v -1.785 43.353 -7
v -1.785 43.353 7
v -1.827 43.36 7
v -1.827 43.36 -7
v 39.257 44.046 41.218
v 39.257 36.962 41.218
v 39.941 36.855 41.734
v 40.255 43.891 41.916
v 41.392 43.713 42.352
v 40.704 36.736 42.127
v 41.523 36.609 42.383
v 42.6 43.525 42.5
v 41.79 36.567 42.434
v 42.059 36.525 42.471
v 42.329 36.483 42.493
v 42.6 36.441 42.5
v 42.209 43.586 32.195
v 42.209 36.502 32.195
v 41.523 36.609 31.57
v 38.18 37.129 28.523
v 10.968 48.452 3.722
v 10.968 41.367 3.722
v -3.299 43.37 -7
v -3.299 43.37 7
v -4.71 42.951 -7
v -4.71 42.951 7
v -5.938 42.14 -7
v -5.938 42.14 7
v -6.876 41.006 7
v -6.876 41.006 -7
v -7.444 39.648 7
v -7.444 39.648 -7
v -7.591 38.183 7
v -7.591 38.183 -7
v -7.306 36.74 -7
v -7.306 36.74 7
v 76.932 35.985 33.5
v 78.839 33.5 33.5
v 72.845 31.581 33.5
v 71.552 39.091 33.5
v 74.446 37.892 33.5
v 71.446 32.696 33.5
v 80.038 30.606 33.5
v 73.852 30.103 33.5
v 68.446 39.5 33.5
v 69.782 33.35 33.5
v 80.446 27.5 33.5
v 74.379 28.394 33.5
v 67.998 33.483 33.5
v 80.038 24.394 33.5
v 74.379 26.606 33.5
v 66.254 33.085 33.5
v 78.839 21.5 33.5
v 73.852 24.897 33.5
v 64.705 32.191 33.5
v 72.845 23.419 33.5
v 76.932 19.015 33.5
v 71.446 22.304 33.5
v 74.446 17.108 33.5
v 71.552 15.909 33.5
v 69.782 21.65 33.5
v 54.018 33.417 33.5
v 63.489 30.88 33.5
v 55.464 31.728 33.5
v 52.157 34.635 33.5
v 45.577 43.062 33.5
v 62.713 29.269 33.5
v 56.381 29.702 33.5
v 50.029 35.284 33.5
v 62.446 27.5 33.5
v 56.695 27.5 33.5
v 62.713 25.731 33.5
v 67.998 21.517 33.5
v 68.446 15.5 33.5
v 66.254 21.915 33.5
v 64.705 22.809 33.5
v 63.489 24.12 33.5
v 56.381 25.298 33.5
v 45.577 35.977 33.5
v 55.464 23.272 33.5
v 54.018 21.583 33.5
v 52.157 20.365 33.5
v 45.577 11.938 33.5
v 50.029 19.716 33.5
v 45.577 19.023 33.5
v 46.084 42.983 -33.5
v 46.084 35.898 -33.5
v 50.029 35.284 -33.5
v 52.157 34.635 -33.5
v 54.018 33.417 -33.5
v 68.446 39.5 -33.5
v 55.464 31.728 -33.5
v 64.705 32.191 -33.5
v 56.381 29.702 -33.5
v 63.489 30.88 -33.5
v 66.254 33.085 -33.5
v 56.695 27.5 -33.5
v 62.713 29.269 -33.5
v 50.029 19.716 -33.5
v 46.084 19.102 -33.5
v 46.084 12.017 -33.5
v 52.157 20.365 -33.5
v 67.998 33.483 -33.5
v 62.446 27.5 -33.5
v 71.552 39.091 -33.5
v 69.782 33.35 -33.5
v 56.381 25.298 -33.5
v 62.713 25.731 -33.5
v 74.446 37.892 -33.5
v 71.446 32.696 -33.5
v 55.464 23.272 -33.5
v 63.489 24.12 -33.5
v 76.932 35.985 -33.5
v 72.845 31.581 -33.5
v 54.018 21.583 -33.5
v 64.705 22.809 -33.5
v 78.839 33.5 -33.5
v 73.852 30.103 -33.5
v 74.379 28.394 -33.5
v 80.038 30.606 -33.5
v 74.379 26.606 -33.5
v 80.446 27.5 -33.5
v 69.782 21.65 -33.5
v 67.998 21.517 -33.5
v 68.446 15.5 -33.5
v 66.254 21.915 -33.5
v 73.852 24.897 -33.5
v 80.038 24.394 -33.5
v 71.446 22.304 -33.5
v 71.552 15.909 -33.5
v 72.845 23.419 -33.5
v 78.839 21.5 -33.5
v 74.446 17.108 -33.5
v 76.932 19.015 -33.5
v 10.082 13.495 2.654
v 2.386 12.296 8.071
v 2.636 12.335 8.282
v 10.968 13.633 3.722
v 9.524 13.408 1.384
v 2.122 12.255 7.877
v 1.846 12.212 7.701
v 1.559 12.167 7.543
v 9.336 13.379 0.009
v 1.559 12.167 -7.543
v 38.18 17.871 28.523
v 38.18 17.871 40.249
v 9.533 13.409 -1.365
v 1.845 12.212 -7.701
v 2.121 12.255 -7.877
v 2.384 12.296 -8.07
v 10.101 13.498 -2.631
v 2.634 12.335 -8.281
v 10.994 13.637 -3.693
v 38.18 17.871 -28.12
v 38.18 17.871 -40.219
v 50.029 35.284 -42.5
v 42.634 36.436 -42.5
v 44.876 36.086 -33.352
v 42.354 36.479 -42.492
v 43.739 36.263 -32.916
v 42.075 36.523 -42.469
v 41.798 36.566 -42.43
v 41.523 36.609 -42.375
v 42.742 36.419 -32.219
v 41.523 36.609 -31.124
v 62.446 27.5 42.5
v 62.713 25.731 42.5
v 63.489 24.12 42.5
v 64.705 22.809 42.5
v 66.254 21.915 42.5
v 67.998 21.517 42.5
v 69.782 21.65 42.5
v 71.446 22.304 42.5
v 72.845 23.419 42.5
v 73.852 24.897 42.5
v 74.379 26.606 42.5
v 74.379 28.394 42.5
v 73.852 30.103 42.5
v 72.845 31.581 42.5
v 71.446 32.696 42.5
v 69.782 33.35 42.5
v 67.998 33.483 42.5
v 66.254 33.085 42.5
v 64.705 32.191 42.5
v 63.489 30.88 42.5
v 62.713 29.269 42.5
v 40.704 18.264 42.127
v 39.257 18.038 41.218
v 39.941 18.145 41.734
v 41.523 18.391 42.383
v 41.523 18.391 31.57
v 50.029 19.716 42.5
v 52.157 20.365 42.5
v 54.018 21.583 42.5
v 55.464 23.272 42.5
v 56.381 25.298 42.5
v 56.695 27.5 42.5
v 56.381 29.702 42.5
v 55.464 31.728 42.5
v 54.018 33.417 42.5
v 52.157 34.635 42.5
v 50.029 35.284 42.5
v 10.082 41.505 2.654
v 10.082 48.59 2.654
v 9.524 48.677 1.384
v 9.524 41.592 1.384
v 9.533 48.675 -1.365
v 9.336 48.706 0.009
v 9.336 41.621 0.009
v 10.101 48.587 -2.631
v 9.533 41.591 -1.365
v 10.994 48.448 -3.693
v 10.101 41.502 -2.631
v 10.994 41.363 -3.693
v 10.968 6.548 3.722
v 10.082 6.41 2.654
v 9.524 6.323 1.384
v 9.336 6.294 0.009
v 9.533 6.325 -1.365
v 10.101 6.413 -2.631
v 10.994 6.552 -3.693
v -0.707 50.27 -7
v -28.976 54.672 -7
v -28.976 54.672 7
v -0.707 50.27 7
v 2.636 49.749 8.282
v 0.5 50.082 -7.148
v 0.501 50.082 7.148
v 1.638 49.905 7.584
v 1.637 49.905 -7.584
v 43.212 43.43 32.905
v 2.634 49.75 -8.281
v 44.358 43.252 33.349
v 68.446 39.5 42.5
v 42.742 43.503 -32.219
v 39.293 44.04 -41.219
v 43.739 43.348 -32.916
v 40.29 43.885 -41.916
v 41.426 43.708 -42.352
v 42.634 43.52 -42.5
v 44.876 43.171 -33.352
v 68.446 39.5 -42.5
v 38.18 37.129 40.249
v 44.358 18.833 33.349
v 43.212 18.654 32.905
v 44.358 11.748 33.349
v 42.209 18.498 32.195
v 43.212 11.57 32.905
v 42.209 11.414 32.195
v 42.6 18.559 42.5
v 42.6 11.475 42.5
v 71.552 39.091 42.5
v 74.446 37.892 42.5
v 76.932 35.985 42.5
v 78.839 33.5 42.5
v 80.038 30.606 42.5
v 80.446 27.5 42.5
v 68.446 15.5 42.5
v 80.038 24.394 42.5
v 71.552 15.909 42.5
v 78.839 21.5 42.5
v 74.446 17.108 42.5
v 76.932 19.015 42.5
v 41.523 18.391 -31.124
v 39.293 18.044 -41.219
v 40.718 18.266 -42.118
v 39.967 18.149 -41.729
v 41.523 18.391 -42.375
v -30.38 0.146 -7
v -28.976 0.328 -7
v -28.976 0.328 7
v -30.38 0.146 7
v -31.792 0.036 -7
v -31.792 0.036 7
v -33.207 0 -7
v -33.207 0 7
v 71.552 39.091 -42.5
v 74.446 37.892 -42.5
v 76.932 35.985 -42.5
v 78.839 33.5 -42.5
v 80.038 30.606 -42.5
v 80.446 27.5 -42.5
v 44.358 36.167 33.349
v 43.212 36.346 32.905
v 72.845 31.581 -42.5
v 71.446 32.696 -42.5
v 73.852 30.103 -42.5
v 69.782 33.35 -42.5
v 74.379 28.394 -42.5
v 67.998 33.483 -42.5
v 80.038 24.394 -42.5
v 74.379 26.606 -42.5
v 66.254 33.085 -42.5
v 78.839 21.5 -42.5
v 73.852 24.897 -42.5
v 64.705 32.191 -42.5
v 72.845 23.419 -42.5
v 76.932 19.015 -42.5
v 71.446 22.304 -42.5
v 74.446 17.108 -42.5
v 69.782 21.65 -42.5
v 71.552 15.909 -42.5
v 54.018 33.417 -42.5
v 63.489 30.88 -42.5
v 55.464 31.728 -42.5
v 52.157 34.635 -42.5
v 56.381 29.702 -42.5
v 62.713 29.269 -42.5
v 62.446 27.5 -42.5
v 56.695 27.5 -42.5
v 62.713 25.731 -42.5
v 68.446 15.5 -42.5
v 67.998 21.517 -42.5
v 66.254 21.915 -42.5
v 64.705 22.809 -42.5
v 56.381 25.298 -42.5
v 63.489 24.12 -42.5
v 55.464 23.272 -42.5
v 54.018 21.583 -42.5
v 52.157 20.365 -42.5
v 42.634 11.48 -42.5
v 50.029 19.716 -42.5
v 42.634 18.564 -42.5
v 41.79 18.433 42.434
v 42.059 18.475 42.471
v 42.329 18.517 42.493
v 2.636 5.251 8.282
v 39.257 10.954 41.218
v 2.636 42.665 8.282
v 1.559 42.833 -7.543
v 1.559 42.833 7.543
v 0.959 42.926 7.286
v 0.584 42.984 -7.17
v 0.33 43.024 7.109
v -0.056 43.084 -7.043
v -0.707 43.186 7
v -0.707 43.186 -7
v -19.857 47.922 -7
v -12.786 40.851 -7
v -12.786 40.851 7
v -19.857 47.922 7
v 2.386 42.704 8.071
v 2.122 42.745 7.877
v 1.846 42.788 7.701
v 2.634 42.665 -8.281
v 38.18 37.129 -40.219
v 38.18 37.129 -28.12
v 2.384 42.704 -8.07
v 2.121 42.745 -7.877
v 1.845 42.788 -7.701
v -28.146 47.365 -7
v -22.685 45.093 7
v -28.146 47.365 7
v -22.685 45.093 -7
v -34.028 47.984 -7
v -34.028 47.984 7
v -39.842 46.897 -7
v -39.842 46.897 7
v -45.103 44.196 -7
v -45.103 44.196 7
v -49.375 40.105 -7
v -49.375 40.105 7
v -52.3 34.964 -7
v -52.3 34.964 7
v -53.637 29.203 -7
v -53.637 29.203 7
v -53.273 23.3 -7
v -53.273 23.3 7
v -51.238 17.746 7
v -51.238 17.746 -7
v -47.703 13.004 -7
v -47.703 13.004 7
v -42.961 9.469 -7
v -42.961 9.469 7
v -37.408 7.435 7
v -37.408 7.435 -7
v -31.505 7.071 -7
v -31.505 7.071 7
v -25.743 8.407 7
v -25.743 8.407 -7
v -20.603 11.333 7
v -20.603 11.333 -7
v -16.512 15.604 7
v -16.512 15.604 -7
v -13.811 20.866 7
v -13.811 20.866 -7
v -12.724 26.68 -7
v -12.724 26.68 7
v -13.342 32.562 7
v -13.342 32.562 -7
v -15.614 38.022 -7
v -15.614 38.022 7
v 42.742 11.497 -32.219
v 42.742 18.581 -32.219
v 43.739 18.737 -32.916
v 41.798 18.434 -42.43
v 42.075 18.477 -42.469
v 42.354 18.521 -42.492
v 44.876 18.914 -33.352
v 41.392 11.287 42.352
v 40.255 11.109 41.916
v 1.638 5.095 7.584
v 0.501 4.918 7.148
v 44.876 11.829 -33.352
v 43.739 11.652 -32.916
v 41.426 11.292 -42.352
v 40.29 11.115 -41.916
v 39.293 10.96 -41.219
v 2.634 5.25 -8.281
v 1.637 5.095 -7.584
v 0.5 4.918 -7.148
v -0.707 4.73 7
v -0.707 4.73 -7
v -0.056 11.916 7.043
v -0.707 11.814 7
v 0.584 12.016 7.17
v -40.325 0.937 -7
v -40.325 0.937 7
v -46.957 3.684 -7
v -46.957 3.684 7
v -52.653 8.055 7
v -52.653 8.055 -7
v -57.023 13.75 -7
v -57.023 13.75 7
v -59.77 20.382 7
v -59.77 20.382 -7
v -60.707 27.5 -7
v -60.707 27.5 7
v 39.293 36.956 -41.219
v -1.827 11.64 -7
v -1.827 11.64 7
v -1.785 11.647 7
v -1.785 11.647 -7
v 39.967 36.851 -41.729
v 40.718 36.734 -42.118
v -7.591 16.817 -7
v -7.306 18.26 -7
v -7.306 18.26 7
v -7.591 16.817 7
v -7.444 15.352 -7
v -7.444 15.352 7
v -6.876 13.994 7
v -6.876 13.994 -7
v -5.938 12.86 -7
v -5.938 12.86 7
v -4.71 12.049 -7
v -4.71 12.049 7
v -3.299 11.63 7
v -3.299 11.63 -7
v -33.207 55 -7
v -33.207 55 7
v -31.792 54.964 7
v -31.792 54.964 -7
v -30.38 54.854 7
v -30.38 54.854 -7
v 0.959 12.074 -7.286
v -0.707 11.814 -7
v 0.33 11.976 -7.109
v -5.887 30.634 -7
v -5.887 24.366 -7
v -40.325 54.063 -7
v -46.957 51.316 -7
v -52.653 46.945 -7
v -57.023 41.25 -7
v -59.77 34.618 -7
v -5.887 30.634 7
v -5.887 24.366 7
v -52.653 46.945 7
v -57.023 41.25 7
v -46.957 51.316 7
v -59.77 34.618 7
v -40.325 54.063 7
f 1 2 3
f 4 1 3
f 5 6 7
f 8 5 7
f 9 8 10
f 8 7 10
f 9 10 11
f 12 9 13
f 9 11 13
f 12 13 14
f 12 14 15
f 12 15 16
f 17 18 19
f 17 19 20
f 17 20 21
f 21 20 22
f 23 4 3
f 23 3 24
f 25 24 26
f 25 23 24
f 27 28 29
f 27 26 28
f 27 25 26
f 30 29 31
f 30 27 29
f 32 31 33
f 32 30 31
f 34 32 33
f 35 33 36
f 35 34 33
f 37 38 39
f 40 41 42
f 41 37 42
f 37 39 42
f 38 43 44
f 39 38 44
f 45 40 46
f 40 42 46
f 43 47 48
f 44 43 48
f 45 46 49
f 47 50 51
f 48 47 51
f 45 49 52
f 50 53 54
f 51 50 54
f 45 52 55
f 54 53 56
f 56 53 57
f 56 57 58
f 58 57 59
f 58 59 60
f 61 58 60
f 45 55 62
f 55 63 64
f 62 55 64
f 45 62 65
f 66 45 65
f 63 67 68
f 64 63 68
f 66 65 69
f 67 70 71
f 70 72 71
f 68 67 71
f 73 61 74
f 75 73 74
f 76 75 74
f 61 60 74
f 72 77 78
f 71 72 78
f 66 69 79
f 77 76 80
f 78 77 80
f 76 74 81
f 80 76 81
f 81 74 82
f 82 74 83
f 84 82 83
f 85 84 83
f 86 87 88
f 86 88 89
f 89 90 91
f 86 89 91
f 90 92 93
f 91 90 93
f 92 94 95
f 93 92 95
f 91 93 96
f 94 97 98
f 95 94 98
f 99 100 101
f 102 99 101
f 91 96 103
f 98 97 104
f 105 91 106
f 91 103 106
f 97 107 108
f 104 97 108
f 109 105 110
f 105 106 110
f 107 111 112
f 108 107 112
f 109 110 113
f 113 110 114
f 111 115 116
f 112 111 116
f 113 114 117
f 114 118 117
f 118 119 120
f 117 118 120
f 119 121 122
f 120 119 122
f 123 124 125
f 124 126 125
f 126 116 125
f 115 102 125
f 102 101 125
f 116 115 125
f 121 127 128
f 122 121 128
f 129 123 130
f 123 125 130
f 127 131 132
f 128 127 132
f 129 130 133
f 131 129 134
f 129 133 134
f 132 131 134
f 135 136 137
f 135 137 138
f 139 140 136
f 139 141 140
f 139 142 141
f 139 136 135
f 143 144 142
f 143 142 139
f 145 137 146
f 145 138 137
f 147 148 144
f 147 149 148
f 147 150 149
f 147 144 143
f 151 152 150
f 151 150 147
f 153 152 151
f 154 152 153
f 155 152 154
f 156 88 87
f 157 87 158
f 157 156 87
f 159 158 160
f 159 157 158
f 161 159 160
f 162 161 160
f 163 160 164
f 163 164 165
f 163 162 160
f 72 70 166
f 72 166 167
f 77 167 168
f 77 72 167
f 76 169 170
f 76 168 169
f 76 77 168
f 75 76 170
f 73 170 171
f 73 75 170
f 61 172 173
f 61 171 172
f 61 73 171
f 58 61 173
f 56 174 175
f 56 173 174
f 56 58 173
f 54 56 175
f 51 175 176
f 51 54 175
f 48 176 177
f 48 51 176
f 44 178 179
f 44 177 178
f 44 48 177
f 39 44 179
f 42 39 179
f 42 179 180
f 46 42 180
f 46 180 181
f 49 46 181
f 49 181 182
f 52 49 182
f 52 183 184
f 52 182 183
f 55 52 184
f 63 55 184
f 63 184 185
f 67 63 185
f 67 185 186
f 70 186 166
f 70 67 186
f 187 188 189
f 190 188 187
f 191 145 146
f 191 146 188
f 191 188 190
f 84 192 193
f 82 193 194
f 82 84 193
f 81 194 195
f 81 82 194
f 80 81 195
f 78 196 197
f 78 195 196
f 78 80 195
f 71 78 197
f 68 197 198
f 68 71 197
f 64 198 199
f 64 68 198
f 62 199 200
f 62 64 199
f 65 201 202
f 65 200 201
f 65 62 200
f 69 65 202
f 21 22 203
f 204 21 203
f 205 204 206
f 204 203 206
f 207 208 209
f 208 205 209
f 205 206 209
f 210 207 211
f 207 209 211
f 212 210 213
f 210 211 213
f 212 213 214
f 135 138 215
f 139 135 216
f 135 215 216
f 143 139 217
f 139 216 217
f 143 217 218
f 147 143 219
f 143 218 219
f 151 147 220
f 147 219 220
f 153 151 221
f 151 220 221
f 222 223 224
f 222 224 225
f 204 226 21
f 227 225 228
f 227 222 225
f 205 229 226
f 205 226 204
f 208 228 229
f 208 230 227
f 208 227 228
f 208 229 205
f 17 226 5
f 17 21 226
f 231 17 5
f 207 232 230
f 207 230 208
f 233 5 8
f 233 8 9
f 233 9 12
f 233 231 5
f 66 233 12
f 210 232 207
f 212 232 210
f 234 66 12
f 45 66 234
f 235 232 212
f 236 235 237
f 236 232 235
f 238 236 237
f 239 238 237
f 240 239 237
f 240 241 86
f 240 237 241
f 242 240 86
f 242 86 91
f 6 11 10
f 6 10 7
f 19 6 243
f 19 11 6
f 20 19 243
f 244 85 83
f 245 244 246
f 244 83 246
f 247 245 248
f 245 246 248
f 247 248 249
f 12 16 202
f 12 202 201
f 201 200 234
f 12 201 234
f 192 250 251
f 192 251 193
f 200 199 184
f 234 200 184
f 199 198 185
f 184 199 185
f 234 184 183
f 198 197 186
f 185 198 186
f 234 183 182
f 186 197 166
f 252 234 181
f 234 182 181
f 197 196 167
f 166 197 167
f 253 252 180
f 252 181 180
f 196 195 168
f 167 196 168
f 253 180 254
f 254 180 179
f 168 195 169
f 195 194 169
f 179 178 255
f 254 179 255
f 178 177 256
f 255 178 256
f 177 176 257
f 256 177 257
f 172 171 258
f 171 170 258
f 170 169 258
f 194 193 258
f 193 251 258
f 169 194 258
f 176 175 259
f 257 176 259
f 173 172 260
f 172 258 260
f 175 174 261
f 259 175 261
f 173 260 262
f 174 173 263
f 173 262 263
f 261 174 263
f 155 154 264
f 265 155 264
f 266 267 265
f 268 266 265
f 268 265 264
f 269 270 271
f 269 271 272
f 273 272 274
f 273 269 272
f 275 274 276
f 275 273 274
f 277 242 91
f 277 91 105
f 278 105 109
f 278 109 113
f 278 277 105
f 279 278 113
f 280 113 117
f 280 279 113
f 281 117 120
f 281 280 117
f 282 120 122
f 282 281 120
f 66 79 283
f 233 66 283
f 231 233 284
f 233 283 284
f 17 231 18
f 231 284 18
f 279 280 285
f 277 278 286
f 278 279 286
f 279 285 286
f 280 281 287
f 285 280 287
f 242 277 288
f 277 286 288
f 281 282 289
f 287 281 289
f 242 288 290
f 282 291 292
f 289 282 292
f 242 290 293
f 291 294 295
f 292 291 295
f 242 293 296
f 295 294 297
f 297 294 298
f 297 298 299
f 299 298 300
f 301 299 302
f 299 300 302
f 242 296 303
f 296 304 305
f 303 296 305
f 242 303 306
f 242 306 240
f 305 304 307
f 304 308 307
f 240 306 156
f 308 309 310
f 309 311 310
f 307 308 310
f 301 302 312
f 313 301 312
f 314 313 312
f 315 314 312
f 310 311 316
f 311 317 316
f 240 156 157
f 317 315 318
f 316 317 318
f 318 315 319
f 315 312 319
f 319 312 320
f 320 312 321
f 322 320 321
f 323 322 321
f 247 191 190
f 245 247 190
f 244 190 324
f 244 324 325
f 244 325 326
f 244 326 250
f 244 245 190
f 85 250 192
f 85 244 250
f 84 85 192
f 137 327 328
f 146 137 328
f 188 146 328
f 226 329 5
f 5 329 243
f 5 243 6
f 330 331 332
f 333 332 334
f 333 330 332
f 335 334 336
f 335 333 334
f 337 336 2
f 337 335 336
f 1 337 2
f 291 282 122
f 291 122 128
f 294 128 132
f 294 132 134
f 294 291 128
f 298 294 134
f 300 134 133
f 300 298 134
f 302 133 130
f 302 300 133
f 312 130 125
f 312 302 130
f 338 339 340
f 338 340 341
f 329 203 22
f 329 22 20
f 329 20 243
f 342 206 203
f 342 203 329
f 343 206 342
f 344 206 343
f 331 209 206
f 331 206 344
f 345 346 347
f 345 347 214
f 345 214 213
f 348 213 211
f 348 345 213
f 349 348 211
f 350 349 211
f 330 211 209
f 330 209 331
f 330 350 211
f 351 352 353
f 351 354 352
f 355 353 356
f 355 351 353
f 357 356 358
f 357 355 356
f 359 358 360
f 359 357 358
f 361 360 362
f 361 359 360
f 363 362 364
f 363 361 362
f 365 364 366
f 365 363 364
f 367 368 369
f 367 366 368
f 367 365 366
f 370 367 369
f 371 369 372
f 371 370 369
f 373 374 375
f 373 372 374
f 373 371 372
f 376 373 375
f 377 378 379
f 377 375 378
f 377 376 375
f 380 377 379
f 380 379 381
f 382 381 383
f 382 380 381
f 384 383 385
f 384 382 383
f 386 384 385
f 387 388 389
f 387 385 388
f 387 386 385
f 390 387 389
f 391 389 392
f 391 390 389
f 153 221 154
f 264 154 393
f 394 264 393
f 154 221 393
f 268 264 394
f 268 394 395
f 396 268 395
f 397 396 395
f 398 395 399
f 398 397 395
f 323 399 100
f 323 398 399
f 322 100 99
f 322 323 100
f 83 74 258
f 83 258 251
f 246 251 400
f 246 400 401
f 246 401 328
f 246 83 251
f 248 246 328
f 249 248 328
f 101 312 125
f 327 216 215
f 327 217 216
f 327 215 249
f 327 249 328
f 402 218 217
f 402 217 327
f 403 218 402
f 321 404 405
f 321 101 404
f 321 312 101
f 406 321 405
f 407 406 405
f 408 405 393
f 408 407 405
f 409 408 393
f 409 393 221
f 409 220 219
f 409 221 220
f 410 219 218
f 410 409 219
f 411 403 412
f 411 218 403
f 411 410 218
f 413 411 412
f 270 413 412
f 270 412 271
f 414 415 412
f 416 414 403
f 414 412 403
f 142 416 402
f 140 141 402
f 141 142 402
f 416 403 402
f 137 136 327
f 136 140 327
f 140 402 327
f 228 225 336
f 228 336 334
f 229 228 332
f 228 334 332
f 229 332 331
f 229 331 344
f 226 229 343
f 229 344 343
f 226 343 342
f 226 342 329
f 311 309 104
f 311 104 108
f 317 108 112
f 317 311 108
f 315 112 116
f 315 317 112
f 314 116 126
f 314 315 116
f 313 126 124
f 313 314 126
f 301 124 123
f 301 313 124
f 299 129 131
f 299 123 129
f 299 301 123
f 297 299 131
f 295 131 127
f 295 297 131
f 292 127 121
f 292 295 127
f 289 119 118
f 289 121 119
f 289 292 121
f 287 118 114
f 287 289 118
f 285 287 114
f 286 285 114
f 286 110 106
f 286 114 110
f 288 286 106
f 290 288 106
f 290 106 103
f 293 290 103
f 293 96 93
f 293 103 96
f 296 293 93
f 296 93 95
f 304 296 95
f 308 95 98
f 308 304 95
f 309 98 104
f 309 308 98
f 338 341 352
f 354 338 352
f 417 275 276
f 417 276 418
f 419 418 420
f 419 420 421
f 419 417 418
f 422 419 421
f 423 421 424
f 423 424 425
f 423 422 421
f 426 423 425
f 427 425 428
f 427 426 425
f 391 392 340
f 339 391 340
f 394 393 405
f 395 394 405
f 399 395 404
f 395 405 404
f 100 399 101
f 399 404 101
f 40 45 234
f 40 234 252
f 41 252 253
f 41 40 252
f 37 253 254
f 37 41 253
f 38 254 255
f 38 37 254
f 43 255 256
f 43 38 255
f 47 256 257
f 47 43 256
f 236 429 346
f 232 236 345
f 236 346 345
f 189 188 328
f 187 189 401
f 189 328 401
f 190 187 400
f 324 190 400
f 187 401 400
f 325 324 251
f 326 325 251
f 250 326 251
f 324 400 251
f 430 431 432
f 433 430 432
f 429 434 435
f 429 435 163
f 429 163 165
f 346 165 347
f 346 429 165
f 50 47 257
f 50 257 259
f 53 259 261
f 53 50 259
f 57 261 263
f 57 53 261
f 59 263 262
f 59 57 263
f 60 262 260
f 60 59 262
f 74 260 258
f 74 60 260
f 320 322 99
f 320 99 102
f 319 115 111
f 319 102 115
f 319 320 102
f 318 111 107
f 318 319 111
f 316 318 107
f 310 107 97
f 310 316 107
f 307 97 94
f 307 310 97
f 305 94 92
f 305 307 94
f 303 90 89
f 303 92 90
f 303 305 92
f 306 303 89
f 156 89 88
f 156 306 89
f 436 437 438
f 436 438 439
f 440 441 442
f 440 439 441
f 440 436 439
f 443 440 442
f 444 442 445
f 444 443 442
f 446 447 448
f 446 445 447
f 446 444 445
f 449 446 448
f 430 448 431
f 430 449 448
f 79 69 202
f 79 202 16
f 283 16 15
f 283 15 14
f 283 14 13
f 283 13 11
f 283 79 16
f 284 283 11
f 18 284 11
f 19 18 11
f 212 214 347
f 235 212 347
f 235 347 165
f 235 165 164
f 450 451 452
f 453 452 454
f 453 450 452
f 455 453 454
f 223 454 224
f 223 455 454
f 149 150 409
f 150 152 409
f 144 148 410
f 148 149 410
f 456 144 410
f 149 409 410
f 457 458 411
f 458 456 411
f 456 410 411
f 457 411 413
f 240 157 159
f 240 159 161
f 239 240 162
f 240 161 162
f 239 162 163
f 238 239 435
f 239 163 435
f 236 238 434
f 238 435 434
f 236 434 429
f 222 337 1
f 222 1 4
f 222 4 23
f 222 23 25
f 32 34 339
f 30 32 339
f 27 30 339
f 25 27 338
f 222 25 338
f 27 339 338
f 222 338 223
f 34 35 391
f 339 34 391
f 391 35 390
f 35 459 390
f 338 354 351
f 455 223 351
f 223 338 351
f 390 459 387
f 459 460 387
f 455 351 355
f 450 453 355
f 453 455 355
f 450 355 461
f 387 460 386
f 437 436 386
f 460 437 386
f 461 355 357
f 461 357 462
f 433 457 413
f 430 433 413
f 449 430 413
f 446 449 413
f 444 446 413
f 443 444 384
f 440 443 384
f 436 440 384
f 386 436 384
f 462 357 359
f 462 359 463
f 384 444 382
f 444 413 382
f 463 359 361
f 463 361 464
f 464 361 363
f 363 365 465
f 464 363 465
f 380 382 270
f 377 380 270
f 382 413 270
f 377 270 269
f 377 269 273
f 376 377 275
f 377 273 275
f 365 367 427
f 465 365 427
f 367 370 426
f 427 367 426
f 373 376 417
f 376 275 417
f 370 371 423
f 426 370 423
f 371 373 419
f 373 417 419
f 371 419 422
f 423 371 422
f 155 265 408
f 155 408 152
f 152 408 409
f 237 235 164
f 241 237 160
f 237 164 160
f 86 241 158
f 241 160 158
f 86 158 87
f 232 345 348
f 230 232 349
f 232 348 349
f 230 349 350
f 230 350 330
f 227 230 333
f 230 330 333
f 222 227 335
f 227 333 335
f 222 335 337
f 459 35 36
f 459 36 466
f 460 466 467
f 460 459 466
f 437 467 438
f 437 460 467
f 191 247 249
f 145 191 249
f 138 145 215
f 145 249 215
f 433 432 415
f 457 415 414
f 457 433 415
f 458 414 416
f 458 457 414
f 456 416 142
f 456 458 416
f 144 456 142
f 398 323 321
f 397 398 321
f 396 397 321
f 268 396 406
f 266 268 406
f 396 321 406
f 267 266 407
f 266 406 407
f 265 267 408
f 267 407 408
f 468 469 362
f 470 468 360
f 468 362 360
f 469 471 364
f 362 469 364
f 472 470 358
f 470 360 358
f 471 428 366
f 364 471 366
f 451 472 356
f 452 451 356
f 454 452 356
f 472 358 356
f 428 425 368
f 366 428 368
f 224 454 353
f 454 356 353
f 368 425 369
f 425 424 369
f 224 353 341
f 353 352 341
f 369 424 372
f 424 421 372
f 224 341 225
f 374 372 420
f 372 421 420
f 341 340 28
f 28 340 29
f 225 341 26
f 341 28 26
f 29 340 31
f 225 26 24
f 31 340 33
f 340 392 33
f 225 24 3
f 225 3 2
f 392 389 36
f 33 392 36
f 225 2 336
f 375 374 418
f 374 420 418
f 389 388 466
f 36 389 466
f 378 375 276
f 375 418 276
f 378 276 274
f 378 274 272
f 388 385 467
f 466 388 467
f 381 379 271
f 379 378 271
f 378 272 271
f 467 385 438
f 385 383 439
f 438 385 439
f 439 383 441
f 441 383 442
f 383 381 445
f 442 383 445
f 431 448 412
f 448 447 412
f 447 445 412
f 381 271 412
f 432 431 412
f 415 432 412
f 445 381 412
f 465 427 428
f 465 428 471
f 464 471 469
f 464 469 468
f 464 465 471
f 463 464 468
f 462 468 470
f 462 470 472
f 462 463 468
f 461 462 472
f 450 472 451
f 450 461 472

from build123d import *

# Parameters (mm, degrees)
Y_KSEKLIK_EKSTR_ZYON1_DEPTH = 55
KES_EKSTR_ZYON1_DEPTH       = 55
KES_EKSTR_ZYON1_DEPTH_BACK  = 55
IZIM4_R                     = 20.5
IZIM4_R_2                   = 6
KES_EKSTR_ZYON2_DEPTH       = 55
KES_EKSTR_ZYON2_DEPTH_BACK  = 55
KES_EKSTR_ZYON3_DEPTH       = 107.314994316
KES_EKSTR_ZYON3_DEPTH_BACK  = 107.314994316


with BuildPart() as part:
    # Çizim2 → Yükseklik-Ekstrüzyon1 (new body)
    with BuildSketch(Plane(origin=(0, 0, 0), x_dir=(1, 0, 0), z_dir=(0, 1, 0))):
        with BuildLine():
            Line((-60.70745329, -7), (-0.70745329, -7))
            ThreePointArc((-0.70745329, -7), (1.083042474, -7.331582183), (2.636059642, -8.282350033))
            Line((2.636059642, -8.282350033), (39.256799322, -41.217649967))
            ThreePointArc((39.256799322, -41.217649967), (40.809816489, -42.168417817), (42.600312254, -42.5))
            Line((42.600312254, -42.5), (80.446429482, -42.5))
            Line((80.446429482, -42.5), (80.446429482, -33.5))
            Line((80.446429482, -33.5), (45.577301243, -33.5))
            ThreePointArc((45.577301243, -33.5), (43.771367773, -33.162467619), (42.209258712, -32.19544172))
            Line((42.209258712, -32.19544172), (10.967785126, -3.72181941))
            ThreePointArc((10.967785126, -3.72181941), (9.335858983, -0.008678576), (10.994031787, 3.692815818))
            Line((10.994031787, 3.692815818), (42.741966981, 32.219193509))
            ThreePointArc((42.741966981, 32.219193509), (44.294345006, 33.168831093), (46.083762852, 33.5))
            Line((46.083762852, 33.5), (80.446429482, 33.5))
            Line((80.446429482, 33.5), (80.446429482, 42.5))
            Line((80.446429482, 42.5), (42.634342581, 42.5))
            ThreePointArc((42.634342581, 42.5), (40.844924735, 42.168831093), (39.29254671, 41.219193509))
            Line((39.29254671, 41.219193509), (2.634342581, 8.280806491))
            ThreePointArc((2.634342581, 8.280806491), (1.081964556, 7.331168907), (-0.70745329, 7))
            Line((-0.70745329, 7), (-60.70745329, 7))
            Line((-60.70745329, 7), (-60.70745329, -7))
        make_face()
    extrude(amount=Y_KSEKLIK_EKSTR_ZYON1_DEPTH)

    # Çizim4 → Kes-Ekstrüzyon1 (cut, two sides: drawn at the far end of the back side and taken through both)
    with BuildSketch(Plane.XY.offset(-KES_EKSTR_ZYON1_DEPTH_BACK)):
        with BuildLine():
            Line((-28.975635888, 54.672444157), (68.446429482, 39.5))
            ThreePointArc((68.446429482, 39.5), (76.931710856, 35.985281374), (80.446429482, 27.5))
            Line((80.446429482, 27.5), (80.446429482, 55))
            Line((80.446429482, 55), (-33.207453133, 55))
            ThreePointArc((-33.207453133, 55), (-31.085215516, 54.917988745), (-28.975635888, 54.672444157))
        make_face()
        with BuildLine():
            Line((80.446429482, 0), (80.446429482, 27.5))
            ThreePointArc((80.446429482, 27.5), (76.931710856, 19.014718626), (68.446429482, 15.5))
            Line((68.446429482, 15.5), (-28.975635888, 0.327555843))
            ThreePointArc((-28.975635888, 0.327555843), (-31.085215594, 0.082011249), (-33.20745329, 0))
            Line((-33.20745329, 0), (80.446429482, 0))
        make_face()
        with BuildLine():
            ThreePointArc((-60.70745329, 27.5), (-52.652889717, 46.945436538), (-33.207453133, 55))
            Line((-33.207453133, 55), (-60.70745329, 55))
            Line((-60.70745329, 55), (-60.70745329, 27.5))
        make_face()
        with BuildLine():
            ThreePointArc((-33.20745329, 0), (-52.652889773, 8.054563517), (-60.70745329, 27.5))
            Line((-60.70745329, 27.5), (-60.70745329, 0))
            Line((-60.70745329, 0), (-33.20745329, 0))
        make_face()
        with Locations(Location((-33.20745329, 27.5, 0), (0, 0, 180))):
            Circle(IZIM4_R)
        with Locations(Location((68.446429482, 27.5, 0), (0, 0, 180))):
            Circle(IZIM4_R_2)
    extrude(amount=KES_EKSTR_ZYON1_DEPTH + KES_EKSTR_ZYON1_DEPTH_BACK, mode=Mode.SUBTRACT)

    # Çizim7 → Kes-Ekstrüzyon2 (cut, two sides: drawn at the far end of the back side and taken through both)
    with BuildSketch(Plane.XY.offset(-KES_EKSTR_ZYON2_DEPTH_BACK)):
        with BuildLine():
            Line((-15.614003465, 38.022382014), (-12.78557634, 40.850809138))
            Line((-12.78557634, 40.850809138), (-19.856644152, 47.92187695))
            Line((-19.856644152, 47.92187695), (-22.685071277, 45.093449825))
            ThreePointArc((-22.685071277, 45.093449825), (-18.711764276, 41.995689014), (-15.614003465, 38.022382014))
        make_face()
    extrude(amount=KES_EKSTR_ZYON2_DEPTH + KES_EKSTR_ZYON2_DEPTH_BACK, mode=Mode.SUBTRACT)

    # Çizim8 → Kes-Ekstrüzyon3 (cut, two sides: drawn at the far end of the back side and taken through both)
    with BuildSketch(Plane.XY.offset(-KES_EKSTR_ZYON3_DEPTH_BACK)):
        with BuildLine():
            Line((-1.827361747, 11.63999197), (-1.784643175, 11.646644931))
            Line((-1.784643175, 11.646644931), (1.558869757, 12.16736129))
            Line((1.558869757, 12.16736129), (38.179609438, 17.870649613))
            Line((38.179609438, 17.870649613), (41.52312237, 18.391365973))
            Line((41.52312237, 18.391365973), (50.029447873, 19.716135143))
            ThreePointArc((50.029447873, 19.716135143), (56.694891282, 27.5), (50.029447873, 35.283864857))
            Line((50.029447873, 35.283864857), (41.52312237, 36.608634027))
            Line((41.52312237, 36.608634027), (38.179609438, 37.129350387))
            Line((38.179609438, 37.129350387), (1.558869757, 42.83263871))
            Line((1.558869757, 42.83263871), (-1.784643175, 43.353355069))
            Line((-1.784643175, 43.353355069), (-1.827361747, 43.36000803))
            ThreePointArc((-1.827361747, 43.36000803), (-6.448805477, 41.607340849), (-7.306116969, 36.73963077))
            ThreePointArc((-7.306116969, 36.73963077), (-5.70745329, 27.5), (-7.306116969, 18.26036923))
            ThreePointArc((-7.306116969, 18.26036923), (-6.448805477, 13.392659151), (-1.827361747, 11.63999197))
        make_face()
    extrude(amount=KES_EKSTR_ZYON3_DEPTH + KES_EKSTR_ZYON3_DEPTH_BACK, mode=Mode.SUBTRACT)


solid = part.part
